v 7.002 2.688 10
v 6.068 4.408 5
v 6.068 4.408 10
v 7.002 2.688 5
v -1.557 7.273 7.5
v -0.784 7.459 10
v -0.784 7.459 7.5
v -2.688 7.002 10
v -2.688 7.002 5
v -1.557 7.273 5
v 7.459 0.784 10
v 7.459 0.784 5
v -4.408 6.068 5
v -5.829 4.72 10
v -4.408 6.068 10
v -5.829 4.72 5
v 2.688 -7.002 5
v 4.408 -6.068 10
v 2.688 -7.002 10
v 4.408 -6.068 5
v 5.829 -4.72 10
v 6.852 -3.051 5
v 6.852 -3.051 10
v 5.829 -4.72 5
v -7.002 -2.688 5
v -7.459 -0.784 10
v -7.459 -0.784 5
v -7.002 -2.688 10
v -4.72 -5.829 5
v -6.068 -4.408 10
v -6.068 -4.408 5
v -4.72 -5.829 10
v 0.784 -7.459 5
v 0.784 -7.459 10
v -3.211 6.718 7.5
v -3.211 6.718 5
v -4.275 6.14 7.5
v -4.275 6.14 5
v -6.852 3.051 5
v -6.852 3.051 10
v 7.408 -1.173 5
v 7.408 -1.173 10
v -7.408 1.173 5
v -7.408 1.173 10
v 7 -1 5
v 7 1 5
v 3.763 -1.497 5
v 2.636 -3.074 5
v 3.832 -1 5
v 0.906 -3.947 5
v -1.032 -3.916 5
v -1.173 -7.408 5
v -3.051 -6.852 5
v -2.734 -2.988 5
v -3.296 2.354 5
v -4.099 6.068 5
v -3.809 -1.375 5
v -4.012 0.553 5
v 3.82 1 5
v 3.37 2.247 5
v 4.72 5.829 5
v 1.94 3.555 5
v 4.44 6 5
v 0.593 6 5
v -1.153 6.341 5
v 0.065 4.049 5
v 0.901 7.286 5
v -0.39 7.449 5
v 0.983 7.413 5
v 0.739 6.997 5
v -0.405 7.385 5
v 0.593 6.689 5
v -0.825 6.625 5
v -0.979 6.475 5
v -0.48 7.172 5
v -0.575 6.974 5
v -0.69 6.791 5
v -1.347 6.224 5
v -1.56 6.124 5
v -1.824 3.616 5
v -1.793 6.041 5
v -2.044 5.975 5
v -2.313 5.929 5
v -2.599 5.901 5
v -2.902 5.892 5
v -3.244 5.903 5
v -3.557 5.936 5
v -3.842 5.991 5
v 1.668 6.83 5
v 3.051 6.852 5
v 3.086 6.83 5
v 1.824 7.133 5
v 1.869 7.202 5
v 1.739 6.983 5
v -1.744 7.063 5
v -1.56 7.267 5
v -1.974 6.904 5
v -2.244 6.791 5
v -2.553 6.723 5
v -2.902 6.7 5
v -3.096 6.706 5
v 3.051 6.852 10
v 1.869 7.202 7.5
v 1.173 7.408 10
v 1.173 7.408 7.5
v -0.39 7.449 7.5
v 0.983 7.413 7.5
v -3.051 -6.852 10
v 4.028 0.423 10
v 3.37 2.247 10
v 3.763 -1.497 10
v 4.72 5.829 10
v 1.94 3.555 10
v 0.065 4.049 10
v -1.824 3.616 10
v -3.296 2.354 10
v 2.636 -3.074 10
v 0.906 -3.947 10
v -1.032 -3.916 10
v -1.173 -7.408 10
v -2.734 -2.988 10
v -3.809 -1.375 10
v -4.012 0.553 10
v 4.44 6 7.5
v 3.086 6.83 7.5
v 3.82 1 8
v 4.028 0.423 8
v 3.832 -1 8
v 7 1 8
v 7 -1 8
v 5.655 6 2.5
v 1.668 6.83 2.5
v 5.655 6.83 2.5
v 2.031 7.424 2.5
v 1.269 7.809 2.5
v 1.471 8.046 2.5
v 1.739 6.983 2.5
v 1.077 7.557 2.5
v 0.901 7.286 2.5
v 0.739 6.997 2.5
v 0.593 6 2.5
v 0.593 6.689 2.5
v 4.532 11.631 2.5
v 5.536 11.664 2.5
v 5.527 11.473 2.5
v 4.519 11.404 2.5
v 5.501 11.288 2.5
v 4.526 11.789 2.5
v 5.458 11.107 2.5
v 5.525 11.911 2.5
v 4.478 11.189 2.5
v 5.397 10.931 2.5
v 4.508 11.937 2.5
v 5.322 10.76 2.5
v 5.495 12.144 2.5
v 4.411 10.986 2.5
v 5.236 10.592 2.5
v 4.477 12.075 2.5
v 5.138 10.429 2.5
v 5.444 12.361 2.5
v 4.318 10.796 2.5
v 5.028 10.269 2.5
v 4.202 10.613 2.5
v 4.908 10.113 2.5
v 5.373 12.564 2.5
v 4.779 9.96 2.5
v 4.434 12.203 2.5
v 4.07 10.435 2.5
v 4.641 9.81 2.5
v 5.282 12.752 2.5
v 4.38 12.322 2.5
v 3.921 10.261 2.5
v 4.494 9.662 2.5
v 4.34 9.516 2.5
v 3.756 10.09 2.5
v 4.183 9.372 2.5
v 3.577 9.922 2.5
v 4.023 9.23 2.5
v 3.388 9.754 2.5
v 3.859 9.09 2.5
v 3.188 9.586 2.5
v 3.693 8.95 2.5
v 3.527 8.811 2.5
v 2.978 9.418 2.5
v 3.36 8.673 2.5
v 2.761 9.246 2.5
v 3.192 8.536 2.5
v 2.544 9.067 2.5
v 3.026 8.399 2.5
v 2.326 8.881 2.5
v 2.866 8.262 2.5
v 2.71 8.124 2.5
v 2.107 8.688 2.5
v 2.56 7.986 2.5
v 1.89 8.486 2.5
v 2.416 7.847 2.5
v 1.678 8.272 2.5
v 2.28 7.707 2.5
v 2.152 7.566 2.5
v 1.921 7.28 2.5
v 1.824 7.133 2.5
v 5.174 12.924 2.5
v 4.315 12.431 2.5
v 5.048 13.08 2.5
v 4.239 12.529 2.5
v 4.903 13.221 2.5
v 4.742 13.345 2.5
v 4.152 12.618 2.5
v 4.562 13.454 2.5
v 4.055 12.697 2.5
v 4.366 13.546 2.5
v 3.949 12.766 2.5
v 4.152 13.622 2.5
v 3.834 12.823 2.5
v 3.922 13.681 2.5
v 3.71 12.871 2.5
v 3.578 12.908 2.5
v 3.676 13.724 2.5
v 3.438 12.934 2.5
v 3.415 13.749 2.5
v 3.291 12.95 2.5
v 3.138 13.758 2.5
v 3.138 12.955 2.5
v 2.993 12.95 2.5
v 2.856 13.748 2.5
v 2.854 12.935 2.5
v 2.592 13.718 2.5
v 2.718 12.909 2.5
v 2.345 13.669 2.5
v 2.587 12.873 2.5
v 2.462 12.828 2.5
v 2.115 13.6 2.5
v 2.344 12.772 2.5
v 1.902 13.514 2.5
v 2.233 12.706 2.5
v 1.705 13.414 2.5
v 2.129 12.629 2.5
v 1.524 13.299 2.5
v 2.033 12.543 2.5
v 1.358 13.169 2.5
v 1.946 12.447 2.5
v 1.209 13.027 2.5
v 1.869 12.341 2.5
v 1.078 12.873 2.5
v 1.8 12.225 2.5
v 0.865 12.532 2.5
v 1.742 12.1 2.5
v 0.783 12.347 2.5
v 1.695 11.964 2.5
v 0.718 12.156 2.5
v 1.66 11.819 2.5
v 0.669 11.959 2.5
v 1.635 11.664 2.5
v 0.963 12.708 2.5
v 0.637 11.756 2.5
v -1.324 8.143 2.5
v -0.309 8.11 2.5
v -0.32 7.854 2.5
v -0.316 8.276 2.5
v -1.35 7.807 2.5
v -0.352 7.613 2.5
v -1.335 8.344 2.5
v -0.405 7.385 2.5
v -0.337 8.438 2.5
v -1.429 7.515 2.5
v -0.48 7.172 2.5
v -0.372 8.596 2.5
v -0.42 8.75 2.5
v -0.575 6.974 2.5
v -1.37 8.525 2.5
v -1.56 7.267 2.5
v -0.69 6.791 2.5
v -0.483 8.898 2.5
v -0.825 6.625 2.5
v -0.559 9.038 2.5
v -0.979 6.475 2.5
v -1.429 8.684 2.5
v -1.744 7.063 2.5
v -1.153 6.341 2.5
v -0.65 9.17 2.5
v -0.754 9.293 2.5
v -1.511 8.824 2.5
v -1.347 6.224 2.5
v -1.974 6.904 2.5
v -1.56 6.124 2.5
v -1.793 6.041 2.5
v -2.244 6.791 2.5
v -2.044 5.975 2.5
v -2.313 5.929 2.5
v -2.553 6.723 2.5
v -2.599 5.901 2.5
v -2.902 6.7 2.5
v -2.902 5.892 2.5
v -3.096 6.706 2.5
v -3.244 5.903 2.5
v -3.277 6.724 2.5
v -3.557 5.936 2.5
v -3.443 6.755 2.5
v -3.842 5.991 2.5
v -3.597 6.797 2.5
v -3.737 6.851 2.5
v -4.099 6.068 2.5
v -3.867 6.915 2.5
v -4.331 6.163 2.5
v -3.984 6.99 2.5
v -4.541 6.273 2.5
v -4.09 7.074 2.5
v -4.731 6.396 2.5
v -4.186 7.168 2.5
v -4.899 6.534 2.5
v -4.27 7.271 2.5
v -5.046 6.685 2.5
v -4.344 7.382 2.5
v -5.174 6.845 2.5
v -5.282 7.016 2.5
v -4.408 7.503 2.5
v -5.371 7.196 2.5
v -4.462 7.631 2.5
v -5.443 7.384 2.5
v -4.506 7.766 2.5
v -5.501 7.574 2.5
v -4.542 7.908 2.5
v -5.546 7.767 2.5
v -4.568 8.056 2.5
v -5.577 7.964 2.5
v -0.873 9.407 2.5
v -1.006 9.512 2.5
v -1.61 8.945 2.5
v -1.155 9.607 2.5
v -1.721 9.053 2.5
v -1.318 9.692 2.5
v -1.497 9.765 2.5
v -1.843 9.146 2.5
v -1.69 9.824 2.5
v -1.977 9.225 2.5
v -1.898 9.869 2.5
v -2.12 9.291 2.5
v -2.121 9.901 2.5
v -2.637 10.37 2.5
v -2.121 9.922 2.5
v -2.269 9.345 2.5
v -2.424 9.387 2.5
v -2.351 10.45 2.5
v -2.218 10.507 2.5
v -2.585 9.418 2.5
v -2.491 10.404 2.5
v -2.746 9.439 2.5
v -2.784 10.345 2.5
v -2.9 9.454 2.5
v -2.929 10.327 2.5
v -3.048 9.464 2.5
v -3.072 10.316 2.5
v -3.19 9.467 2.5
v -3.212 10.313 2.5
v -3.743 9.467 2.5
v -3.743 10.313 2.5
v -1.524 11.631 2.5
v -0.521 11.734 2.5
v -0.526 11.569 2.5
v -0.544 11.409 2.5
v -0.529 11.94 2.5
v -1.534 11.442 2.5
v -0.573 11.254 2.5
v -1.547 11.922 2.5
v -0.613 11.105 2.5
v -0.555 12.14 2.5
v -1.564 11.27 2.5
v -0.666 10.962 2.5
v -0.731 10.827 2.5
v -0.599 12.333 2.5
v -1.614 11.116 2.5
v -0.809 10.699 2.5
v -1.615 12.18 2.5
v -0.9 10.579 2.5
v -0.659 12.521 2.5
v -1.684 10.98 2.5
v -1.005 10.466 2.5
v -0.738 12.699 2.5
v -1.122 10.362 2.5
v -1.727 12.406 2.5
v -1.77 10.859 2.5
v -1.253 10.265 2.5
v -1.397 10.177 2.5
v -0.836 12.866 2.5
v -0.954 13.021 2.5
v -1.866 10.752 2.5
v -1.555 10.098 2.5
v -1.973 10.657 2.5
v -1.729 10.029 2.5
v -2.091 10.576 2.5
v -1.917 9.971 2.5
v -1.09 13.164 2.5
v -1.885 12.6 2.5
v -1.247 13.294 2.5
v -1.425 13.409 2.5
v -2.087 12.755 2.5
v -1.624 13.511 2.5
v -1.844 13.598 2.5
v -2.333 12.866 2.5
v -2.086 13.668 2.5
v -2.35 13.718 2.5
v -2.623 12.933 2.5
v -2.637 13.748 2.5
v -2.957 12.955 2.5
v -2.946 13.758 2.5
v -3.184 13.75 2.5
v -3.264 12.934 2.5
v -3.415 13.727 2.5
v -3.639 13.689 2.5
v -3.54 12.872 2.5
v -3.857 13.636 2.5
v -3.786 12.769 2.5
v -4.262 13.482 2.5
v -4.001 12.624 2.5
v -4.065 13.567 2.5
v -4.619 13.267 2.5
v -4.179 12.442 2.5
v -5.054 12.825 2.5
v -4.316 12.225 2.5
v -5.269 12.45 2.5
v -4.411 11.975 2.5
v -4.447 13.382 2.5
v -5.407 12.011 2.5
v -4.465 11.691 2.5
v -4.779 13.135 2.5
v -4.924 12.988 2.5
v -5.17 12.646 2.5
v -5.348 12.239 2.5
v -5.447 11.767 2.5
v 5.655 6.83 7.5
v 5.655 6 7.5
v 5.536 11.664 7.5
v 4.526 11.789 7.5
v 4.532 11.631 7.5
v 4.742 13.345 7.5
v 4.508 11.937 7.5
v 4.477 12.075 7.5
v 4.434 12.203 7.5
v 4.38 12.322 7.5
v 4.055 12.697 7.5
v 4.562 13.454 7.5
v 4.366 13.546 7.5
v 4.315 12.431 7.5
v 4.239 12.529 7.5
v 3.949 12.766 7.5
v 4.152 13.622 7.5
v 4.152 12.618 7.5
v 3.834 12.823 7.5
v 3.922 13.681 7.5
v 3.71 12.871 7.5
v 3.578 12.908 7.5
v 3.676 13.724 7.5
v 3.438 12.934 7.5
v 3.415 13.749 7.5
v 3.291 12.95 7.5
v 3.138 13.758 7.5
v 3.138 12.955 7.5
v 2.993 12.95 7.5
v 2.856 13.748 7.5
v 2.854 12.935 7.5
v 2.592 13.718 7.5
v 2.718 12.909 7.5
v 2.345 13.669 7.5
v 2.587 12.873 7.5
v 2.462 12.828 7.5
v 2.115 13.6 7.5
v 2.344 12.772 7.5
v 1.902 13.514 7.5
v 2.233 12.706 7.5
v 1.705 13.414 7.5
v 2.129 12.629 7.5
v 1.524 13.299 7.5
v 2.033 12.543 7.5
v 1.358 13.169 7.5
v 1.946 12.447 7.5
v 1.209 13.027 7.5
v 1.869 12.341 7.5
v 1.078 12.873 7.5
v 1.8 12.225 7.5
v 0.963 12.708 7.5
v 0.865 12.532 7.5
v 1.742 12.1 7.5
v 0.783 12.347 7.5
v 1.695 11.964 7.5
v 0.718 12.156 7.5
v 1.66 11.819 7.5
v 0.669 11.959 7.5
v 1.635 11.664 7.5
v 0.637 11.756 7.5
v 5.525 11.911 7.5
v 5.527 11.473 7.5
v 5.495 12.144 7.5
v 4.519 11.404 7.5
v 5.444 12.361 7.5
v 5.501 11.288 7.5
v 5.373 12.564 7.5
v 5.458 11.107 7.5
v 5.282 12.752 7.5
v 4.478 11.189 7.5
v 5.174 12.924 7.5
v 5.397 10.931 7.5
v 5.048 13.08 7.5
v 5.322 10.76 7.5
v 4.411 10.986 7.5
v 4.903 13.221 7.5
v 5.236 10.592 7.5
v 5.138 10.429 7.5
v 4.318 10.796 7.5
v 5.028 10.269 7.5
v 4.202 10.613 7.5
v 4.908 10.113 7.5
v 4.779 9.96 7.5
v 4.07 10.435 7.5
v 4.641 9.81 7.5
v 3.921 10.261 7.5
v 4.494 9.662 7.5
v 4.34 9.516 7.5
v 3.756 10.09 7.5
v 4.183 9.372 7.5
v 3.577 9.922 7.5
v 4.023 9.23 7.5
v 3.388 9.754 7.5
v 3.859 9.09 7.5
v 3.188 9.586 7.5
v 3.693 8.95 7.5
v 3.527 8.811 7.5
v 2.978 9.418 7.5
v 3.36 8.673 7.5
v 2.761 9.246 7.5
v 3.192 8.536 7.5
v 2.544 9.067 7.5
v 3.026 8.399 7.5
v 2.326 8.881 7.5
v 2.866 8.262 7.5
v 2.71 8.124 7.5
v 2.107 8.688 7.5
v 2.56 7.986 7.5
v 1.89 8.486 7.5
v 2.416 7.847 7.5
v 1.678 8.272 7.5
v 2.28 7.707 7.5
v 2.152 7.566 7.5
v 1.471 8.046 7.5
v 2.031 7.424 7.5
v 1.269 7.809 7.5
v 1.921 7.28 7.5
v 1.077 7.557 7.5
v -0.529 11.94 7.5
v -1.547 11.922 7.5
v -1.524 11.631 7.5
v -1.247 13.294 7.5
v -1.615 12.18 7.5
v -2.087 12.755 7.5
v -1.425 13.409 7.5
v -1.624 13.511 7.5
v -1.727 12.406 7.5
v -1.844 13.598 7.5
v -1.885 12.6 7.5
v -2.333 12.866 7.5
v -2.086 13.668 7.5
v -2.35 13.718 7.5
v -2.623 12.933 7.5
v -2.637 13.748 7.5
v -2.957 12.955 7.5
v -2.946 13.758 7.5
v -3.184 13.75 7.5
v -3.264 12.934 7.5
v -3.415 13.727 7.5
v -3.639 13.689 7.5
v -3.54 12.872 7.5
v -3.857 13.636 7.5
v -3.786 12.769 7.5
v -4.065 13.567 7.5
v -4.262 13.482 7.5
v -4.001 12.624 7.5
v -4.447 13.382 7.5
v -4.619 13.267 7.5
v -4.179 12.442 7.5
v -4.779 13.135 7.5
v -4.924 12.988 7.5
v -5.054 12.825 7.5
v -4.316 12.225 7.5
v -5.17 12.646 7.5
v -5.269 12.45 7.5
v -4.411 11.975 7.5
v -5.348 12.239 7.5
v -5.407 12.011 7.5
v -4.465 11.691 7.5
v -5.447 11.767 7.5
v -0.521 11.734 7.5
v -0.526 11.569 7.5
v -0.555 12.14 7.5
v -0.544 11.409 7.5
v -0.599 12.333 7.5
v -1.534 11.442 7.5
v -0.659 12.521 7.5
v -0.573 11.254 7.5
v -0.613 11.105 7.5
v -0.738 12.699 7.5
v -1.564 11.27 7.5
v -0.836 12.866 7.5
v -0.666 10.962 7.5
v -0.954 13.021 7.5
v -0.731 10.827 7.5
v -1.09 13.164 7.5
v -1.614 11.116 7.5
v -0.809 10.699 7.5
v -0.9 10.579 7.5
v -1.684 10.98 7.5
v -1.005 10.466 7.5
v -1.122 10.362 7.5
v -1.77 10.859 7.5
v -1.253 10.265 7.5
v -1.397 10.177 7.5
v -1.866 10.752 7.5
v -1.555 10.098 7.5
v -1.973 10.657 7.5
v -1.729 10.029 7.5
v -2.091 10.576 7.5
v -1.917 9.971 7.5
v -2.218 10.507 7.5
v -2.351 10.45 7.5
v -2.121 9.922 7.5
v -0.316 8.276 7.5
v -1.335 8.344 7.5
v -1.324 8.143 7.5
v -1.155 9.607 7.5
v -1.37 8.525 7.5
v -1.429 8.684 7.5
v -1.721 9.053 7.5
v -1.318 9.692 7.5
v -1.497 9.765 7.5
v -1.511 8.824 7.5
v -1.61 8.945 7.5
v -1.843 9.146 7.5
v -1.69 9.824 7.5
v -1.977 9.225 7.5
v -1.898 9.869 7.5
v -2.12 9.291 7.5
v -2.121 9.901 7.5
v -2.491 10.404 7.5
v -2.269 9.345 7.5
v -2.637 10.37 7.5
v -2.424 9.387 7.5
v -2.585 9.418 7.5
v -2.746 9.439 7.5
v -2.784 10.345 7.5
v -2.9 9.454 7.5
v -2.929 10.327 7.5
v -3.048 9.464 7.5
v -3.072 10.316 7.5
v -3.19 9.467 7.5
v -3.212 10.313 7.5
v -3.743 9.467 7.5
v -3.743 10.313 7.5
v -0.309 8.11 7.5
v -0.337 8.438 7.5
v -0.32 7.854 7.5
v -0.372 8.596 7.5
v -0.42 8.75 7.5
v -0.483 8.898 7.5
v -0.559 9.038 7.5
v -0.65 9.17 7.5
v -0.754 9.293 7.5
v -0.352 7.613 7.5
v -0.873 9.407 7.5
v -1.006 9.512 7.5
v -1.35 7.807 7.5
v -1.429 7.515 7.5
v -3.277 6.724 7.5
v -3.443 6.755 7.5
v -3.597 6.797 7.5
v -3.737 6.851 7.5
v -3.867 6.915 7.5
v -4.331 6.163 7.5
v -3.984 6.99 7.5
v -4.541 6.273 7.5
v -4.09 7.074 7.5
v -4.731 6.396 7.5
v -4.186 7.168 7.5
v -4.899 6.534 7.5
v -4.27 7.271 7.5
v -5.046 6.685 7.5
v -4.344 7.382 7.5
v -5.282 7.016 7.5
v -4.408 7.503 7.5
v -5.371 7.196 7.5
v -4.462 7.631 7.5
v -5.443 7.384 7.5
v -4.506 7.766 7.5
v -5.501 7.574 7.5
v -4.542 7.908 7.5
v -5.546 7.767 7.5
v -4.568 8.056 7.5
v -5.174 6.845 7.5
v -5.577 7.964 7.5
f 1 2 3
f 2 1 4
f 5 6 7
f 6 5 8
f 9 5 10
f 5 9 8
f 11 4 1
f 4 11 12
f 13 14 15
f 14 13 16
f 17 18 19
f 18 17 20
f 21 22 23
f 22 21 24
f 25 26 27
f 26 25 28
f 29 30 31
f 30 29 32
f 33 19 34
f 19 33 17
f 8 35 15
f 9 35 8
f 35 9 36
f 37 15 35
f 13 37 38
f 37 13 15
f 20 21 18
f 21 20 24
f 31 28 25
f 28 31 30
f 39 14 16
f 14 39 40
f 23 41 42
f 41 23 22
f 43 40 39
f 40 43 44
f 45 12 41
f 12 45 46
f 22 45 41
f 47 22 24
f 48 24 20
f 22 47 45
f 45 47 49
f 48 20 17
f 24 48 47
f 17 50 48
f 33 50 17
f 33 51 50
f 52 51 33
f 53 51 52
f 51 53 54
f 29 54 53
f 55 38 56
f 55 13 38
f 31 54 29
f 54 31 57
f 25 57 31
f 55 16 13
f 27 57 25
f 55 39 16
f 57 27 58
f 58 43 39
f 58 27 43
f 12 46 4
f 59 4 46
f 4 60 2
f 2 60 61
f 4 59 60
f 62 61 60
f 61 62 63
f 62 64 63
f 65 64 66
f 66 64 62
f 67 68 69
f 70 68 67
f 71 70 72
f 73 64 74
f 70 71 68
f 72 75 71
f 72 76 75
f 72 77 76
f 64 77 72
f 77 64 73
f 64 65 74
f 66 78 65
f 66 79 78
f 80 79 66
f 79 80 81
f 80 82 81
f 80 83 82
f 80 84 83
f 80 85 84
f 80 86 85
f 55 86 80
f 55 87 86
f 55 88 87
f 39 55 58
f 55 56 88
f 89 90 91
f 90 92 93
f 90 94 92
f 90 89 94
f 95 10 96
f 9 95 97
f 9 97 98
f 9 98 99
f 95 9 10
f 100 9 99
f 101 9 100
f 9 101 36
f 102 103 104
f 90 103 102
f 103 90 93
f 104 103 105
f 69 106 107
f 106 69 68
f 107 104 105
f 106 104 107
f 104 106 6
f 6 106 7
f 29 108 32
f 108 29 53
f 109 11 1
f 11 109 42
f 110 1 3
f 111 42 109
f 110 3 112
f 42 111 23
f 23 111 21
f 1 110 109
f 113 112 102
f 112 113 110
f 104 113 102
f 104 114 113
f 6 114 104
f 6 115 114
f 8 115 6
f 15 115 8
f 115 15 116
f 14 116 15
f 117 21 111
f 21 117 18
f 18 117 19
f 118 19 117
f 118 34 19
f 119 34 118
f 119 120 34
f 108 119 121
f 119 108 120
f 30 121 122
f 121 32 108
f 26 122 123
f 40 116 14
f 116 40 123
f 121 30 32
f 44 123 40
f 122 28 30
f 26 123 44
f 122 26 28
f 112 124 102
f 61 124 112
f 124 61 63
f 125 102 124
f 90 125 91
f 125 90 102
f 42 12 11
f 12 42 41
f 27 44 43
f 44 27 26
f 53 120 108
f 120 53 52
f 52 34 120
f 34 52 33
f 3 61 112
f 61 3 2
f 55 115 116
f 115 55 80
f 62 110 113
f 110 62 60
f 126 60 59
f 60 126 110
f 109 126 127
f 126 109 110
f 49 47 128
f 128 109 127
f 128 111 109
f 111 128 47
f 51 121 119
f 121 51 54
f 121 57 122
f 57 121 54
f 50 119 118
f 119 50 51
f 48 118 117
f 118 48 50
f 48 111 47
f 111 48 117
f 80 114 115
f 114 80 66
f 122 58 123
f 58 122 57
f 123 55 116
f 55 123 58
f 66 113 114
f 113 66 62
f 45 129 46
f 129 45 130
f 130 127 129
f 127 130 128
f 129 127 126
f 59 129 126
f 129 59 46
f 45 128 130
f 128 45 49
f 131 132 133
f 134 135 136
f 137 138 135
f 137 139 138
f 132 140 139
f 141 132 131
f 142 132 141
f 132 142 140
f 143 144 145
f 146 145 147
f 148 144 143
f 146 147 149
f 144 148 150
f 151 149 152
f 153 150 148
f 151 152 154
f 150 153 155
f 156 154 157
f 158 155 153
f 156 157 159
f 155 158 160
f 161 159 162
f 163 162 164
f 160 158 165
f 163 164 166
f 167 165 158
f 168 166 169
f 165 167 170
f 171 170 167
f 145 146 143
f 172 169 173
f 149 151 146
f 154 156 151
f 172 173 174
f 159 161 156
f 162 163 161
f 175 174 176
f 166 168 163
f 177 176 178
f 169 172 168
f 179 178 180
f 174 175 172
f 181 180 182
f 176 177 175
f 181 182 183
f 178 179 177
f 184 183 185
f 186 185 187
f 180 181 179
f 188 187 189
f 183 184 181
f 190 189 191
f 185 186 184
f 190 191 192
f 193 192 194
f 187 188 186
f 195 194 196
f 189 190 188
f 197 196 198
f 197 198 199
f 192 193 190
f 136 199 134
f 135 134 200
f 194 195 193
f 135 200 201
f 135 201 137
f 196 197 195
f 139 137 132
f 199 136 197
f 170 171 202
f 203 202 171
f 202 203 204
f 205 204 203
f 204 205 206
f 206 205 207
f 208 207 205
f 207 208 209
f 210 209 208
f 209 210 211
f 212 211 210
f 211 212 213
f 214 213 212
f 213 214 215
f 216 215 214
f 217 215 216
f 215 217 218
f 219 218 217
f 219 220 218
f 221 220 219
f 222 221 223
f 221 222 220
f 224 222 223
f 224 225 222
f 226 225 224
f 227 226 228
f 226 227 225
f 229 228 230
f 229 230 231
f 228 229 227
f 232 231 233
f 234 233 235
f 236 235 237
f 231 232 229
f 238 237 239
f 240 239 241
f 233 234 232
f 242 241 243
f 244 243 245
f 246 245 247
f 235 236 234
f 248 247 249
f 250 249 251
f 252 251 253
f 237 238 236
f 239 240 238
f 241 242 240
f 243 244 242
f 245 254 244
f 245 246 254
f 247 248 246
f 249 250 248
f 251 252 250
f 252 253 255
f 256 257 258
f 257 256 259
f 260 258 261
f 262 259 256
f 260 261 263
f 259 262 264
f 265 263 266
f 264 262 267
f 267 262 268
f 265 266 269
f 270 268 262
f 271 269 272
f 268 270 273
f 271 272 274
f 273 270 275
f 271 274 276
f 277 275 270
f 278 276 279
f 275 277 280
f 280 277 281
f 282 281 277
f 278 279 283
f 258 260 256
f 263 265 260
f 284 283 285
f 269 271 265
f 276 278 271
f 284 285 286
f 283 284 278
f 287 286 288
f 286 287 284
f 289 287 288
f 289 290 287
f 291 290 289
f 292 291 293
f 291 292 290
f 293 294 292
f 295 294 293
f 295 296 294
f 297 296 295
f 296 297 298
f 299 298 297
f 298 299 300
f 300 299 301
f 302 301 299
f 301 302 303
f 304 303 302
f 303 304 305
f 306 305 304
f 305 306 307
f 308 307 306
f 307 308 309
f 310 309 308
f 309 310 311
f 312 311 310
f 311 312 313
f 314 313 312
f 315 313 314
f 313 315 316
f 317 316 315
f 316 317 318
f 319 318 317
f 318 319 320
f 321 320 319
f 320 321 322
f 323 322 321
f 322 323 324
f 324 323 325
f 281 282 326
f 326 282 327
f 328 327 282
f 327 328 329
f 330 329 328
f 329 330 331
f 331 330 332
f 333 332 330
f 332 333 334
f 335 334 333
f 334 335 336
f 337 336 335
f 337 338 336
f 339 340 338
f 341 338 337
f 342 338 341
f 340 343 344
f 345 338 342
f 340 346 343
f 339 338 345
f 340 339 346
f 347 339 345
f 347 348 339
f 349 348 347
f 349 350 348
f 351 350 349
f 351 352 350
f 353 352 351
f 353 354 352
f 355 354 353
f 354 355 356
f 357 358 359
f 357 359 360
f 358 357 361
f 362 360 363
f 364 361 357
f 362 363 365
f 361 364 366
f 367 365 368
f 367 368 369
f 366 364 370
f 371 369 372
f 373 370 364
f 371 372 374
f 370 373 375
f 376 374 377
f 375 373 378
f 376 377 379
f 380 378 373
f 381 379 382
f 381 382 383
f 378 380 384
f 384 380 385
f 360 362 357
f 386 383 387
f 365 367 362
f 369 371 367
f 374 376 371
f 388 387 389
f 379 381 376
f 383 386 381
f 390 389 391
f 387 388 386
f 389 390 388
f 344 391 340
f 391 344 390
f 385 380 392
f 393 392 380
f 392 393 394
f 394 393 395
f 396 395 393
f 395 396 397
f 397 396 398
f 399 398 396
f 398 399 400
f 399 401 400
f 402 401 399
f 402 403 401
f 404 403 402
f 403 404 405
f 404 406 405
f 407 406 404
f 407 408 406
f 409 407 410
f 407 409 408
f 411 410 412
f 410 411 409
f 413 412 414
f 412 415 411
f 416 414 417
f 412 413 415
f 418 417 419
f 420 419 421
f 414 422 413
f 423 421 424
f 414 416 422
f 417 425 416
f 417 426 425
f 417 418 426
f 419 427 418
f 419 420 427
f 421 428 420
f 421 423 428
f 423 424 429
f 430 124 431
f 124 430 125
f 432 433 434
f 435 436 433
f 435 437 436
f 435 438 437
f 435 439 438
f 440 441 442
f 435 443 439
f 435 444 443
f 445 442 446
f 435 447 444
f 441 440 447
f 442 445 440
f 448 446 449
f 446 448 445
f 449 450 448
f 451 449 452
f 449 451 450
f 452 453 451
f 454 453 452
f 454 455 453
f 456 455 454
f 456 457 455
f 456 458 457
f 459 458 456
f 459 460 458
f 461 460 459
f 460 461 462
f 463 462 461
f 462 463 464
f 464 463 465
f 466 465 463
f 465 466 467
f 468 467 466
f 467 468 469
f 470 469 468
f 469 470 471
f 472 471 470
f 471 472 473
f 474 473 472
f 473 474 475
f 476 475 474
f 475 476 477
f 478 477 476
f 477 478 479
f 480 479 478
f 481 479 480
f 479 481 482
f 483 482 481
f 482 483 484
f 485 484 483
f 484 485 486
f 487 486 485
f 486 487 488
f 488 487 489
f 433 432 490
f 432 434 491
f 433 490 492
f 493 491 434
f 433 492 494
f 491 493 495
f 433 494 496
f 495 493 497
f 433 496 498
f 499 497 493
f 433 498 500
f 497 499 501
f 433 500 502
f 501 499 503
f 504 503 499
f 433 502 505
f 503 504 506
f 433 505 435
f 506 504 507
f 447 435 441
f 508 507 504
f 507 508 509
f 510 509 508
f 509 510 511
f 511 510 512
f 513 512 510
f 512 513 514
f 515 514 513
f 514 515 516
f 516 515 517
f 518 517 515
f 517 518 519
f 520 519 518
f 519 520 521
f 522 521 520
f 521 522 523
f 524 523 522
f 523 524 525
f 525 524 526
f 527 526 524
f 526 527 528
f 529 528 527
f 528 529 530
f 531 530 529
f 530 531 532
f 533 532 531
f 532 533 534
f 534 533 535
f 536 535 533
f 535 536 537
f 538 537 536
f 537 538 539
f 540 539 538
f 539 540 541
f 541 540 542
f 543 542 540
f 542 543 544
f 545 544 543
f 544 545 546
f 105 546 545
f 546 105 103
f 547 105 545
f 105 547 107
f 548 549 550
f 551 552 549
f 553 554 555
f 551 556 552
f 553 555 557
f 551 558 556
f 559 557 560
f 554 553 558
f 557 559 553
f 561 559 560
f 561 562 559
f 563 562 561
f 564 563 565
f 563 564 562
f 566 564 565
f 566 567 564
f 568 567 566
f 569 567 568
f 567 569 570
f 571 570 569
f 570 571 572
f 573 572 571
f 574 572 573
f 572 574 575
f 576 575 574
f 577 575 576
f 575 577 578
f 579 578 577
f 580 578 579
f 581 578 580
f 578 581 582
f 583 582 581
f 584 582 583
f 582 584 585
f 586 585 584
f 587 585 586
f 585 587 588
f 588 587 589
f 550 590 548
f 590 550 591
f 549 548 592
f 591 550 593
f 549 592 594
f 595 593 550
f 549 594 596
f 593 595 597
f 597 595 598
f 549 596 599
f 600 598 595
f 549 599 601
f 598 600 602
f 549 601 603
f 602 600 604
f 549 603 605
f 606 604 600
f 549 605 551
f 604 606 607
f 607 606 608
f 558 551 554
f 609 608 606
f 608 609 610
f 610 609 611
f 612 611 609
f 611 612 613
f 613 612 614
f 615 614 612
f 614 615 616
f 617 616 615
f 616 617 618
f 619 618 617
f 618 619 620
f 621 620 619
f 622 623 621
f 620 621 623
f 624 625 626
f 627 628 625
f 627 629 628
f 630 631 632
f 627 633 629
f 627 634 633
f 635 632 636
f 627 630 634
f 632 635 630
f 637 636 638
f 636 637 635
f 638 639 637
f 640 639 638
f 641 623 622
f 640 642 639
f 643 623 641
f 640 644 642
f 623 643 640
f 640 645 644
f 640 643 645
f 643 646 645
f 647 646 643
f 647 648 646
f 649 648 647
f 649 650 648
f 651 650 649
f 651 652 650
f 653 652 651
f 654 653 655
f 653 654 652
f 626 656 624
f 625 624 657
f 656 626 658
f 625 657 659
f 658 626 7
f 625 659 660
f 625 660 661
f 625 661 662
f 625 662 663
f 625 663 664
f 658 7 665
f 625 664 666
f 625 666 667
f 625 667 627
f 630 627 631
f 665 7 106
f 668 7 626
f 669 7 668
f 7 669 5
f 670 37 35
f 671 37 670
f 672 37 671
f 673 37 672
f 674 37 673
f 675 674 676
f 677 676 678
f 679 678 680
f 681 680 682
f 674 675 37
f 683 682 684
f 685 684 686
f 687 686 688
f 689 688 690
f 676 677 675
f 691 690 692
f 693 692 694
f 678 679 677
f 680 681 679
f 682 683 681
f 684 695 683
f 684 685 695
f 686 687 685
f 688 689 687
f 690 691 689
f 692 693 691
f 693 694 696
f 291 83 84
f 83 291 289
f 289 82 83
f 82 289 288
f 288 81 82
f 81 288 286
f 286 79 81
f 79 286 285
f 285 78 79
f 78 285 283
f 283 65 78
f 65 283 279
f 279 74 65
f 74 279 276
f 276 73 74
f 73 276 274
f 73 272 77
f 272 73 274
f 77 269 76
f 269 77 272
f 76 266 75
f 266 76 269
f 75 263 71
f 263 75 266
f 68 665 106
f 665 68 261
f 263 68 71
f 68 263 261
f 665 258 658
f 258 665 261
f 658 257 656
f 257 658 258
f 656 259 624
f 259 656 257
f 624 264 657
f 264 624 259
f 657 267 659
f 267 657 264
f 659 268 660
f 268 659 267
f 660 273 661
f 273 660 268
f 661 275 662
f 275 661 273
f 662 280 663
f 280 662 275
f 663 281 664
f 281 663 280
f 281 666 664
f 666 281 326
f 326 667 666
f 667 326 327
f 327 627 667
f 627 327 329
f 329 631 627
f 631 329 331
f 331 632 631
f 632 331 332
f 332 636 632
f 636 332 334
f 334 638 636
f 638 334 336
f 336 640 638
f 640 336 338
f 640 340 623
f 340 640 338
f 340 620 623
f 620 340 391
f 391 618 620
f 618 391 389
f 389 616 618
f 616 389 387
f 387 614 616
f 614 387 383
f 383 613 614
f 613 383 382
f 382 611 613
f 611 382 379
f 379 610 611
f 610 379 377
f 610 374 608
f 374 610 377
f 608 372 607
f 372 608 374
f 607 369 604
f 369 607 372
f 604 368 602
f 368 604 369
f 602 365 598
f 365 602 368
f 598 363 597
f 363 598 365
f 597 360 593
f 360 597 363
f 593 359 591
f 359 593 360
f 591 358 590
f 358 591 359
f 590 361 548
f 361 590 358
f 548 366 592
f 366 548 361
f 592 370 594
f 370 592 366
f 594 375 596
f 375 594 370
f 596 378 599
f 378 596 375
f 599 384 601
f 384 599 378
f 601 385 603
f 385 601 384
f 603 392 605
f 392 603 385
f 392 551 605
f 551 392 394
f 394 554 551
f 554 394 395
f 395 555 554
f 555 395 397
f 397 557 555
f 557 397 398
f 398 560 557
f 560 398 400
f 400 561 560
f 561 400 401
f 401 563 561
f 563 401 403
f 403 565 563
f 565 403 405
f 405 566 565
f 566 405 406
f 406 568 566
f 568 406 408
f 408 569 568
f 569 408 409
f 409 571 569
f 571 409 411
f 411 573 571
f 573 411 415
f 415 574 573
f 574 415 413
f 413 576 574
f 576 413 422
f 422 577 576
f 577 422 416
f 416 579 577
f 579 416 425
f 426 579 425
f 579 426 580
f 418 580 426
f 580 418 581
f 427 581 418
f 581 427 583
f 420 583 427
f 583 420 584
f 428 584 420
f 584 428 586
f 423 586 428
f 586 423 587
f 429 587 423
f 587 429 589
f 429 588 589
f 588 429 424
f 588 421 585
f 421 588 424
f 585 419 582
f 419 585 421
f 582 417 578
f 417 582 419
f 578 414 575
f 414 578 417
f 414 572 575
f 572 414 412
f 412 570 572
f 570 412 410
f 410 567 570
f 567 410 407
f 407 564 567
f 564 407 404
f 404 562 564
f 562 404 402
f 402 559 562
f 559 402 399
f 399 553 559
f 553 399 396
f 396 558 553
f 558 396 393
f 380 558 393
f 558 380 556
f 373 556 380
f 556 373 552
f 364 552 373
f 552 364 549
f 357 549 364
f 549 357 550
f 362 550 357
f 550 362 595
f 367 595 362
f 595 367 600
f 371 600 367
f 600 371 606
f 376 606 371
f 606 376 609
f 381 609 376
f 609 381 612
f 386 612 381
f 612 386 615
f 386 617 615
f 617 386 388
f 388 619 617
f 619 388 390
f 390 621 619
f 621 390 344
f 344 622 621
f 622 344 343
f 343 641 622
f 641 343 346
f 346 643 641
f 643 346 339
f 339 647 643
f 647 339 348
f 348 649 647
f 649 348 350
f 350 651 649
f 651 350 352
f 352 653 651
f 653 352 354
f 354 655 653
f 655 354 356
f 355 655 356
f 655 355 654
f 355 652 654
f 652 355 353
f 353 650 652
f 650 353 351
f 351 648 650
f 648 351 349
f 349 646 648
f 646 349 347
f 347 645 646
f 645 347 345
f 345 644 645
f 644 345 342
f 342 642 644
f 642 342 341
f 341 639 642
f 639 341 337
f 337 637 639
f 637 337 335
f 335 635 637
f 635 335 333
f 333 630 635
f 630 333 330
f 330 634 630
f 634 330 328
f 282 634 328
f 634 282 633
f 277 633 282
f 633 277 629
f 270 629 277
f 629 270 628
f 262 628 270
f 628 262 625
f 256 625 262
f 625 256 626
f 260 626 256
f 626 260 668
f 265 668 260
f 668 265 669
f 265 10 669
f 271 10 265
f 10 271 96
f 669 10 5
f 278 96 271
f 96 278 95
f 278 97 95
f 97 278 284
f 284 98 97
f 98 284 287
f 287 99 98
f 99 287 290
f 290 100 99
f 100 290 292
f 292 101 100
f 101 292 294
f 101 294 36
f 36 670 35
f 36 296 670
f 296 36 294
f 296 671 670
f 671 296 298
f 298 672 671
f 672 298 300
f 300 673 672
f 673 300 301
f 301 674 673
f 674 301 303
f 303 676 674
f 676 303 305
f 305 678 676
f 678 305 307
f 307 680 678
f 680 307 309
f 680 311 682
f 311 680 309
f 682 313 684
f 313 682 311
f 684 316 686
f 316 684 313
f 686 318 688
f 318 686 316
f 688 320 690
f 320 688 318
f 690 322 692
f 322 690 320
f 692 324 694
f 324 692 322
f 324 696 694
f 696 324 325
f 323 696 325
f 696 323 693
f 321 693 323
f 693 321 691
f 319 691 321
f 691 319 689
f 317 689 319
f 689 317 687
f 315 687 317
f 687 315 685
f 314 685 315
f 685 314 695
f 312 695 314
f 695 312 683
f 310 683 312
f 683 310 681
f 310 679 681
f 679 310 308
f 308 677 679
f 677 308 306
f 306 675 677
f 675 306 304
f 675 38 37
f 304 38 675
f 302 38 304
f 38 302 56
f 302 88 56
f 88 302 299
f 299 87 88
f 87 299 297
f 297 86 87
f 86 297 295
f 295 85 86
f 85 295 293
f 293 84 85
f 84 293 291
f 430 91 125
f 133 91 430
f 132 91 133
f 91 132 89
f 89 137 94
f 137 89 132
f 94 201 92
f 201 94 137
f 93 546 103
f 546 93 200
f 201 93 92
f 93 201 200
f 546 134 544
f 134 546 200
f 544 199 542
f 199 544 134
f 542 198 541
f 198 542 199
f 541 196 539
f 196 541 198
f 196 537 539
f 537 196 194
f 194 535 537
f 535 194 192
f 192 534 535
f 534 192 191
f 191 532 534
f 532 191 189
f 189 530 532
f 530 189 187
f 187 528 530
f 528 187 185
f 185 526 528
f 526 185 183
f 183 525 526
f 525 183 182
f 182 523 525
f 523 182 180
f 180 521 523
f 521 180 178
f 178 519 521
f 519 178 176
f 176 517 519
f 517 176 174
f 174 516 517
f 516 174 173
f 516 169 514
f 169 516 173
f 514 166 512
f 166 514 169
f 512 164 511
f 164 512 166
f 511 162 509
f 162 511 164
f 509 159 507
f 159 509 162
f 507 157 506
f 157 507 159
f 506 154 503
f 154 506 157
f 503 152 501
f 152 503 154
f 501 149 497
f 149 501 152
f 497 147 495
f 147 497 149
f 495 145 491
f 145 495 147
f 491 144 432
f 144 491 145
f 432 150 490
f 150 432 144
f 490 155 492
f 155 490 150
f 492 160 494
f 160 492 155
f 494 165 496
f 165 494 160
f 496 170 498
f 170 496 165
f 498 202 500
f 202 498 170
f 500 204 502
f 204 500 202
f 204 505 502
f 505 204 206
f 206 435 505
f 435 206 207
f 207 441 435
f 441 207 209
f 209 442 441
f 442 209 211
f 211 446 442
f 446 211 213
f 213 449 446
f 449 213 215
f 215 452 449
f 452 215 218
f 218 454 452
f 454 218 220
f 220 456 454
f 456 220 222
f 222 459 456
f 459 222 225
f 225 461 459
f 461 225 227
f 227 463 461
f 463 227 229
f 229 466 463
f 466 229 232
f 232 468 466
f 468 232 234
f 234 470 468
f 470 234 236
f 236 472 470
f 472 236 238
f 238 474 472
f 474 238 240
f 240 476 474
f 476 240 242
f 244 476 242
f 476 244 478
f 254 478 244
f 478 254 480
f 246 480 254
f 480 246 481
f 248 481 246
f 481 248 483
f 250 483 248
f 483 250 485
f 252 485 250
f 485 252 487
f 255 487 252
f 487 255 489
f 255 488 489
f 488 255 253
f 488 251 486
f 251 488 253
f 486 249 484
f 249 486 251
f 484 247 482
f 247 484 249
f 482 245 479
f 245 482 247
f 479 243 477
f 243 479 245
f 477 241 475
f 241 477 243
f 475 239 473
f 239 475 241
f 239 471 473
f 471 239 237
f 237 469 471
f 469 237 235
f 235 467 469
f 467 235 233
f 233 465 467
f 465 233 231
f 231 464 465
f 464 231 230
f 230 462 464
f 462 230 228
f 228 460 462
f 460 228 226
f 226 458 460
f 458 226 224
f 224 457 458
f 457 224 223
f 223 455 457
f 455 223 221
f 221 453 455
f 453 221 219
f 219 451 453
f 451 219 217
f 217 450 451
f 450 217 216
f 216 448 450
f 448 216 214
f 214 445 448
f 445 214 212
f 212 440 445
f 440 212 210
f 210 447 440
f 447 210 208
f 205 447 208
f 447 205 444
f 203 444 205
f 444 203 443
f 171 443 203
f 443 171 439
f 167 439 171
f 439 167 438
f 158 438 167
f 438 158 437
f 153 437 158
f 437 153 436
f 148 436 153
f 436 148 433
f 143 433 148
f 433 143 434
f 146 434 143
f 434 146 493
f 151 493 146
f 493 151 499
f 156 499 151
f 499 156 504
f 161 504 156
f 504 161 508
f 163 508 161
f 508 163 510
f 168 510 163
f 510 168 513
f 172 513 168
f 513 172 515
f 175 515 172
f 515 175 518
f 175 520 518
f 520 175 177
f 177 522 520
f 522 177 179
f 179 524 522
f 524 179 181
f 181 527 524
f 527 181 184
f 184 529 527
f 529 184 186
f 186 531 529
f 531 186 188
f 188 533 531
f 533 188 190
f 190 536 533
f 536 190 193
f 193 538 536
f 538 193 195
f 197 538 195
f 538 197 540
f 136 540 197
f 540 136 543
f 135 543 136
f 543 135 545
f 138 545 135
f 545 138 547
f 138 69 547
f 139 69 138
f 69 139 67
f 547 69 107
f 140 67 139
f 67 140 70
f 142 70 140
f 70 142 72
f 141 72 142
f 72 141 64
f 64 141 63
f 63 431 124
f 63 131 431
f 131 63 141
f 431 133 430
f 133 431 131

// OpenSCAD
// file: ../robot_settings.scad
main_box_x = 100; // 96
main_box_y = 102;
main_box_z = 74; // 74.5

lfp_main_box_x = 65;
lfp_main_box_y = 151;
lfp_main_box_z = 95;

wall_thickness = 2;

rail_gap = 2;
rail_inset = 7;

rail_thickness = 7;
rail_length = 250;
rail_width = 250;

raspberry_pi_screw_seperation_y = 57;
raspberry_pi_screw_seperation_z = 48;
raspberry_pi_peg_h = 5;

battery_box_peg_h = 6;
battery_box_peg_d = 8;
battery_box_peg_cutout = 5;

gears_module = 1;
pinion_gear_teeth = 32;
pinion_gear_width = 5;
pinion_gear_bore = 8;

gears_setback_distance = 25;
gear_post_height = 2 * pinion_gear_width + rail_thickness + 8 ;

steering_motor_mount_x = 45;
steering_motor_mount_y = 36;
steering_motor_mount_z = 18;
steering_motor_mount_setback_distance = gears_setback_distance + 16;

dc_motor_drivertype = "Teyleten"; // Teyleten
isAdafruit = (dc_motor_drivertype == "Adafruit");

drv8871_x = isAdafruit ? 20.3 : 21.6;
drv8871_y = isAdafruit ?  24 : 25;

drv8871_z = 2;
drv8871_screw_d = 2.5;
drv8871_solder_points_z = 2;

drv8871mount_edge_x = 1.5;
drv8871mount_edge_wall = 3;
drv8871mount_z = 5;
drv8871mount_x = drv8871_x +  drv8871mount_edge_wall - 2* drv8871mount_edge_x;
drv8871mount_y = 19;

drv8871_screw_distance = 15.64;
drv8871_solder_points_d = 1.66;
drv8871_solder_offset_y = 4.4;
drv8871_solder_inner_points_distance = 5;
drv8871_solder_outer_points_distance = 12;

dc_motor_75_1_housing_minus_encoder_z = 53.8;
dc_motor_75_1_encoder_z = 14.75;
dc_motor_housing_minus_encoder_z = 48;
dc_motor_encoder_z = 9.33;
dc_motor_encoder_wheel_d = 13.4;
dc_motor_encoder_wheel_thickness = 5;
dc_motor_encoder_wheel_gap = 3;
dc_motor_encoder_circuit_thickness = 2;
dc_motor_cutout_d = 24.8;
dc_motor_cutout_z = 19.5;


M3_shaft_d = 2.82;

dc_motor_screw_head_z = 2;
dc_motor_screw_head_d = 5.6;
dc_motor_screw_d = 3.2;
dc_motor_screw_offset = 8.5;

dc_motor_axle_ring_z = 3;
dc_motor_axle_ring_d = 7.2;
dc_motor_axle_cutout_d = 4.2;
dc_motor_axle_cutout_z = 10;
dc_motor_axle_notch_cutout = 0.4;
dc_motor_axle_notch_cutout_z = 6;

pdmount_x = 20;
pdmount_y = 30;
pdmount_z = 2;
pdmount_edge_x = 1.5;
pdmount_edge_wall = 3;

steering_shaft_z = 45;
steering_shaft_d = 7;
steering_shaft_motor_fitting_d = 9;
coupler_length = 24.6;
coupler_diameter = 14;
coupler_screw_d = 4;
coupler_screw_z_offset = 5;
coupler_gear_side_insert = 12.6;
steering_shaft_with_coupler_z = steering_shaft_z - coupler_gear_side_insert;

lidar_mount_y = 110;
lidar_mount_x = 65 + 20;
lidar_narrow_screws = 40;
lidar_wide_screws = 56;
lidar_front_to_back_screws = 70;
lidar_screw_d = 3;
lidar_circuitboard_x = 20;
lidar_circuitboard_y = 35;
lidar_circuitboard_z = 1.2;
lidar_cord_length = 29;

ball_bearing_height = 7;
ball_bearing_outer_diameter = 22;
ball_bearing_inner_diameter = 8;

M4_diameter = 5.1;
M3_diameter = 2.9;
M3_length = 35;
M3_cap_length= 3;
M3_cap_diameter = 5.44;

suspension_spring_outer_diameter = 8;
suspension_spring_inner_diameter = 5.3;

armature_holder_height = 20;
armature_holder_thickness = 8;
pull_bar_peg_r = 3.2;
apparatus_locking_peg_d = 4;

rack_module = 1;
rack_length = main_box_x;
rack_height = 5;
rack_width = 10;
rack_teeth = 30;
rack_bore = 3;

pull_bar_length = rail_width / 2 - rack_length + 1;

// tire hardware
axle_length = 24 + ball_bearing_height; 
axle_reciever_inner_diameter = 8.2;
axle_reciever_outer_diameter = 12;
axle_reciever_length = 18.8;
axle_notch_length = 15;
axle_notch_cutout = 2.4;

// power distribution bar
power_bar_cutout_x = 96;
power_bar_y = 19.1;
power_bar_z = 1.5;
power_bar_screw_distance = 91.4;
power_bar_screw_d = 2.8;
power_bar_standoff_z = 5;
power_bar_standoff_d = 6.83;

pico_expander_width = 63;
pico_expander_height = 57;
pico_screw_hole_offset = 3;
pico_screw_hole_d = 2.5;

usbhub_thickness = 11.7;
usbhub_depth = 37.5;
usbhub_width = 86.7;
usbhub_end_port_width = 14.8;
usbhub_end_port_height = 12;
usbhub_front_face_safe_zone_left = 15;
usbhub_front_face_safe_zone_right = 14.8;

switch_w = 16;
switch_cutout_d = 12.2;
switch_bump_h = 2;
switch_bump_l = 18.2;

i2c_mount_thickness = 3;
i2c_w = 28;
i2c_l = 28;
i2c_circuitboard_thickness = 1.23;
i2c_bottom_notch_w = 14.35;
i2c_bottom_notch_depth = 1;
i2c_screw_hole_d = 1.9;
i2c_screw_hole_offset = 1.4;
i2c_pin_l = 11;
i2c_pin_d = 0.8;
i2c_pin_offset = 1.5;
i2c_pin_separation = 2.5;
i2c_all_pins_l = 8.3;
i2c_screen_thickness = 1.88;
i2c_screen_w = 14.6;
i2c_screen_d = 27;
i2c_screen_offset = 4.1;
// main file
include <../robot_settings.scad>
use <MCAD/involute_gears.scad>

module geared() {
      translate([0, 0, 0])
        difference() {
        rotate([0,0,6])
          gear(gear_thickness = pinion_gear_width,
               number_of_teeth = pinion_gear_teeth,
               circular_pitch = gears_module * PI * 1.1,
               bore_diameter = pinion_gear_bore + .1,
               pressure_angle = 20,
               clearance = 0,
               backlash = .5);
          
          translate([0,-1,-2])
          cube([ball_bearing_inner_diameter - 1, 2, 10]);
        }
        
        translate([-6, pinion_gear_teeth / 2 - 10, pinion_gear_width])
        linear_extrude(5, center = true, convexity = 20)
        text(str(pinion_gear_teeth), size = 8);
    }
    geared();
    
